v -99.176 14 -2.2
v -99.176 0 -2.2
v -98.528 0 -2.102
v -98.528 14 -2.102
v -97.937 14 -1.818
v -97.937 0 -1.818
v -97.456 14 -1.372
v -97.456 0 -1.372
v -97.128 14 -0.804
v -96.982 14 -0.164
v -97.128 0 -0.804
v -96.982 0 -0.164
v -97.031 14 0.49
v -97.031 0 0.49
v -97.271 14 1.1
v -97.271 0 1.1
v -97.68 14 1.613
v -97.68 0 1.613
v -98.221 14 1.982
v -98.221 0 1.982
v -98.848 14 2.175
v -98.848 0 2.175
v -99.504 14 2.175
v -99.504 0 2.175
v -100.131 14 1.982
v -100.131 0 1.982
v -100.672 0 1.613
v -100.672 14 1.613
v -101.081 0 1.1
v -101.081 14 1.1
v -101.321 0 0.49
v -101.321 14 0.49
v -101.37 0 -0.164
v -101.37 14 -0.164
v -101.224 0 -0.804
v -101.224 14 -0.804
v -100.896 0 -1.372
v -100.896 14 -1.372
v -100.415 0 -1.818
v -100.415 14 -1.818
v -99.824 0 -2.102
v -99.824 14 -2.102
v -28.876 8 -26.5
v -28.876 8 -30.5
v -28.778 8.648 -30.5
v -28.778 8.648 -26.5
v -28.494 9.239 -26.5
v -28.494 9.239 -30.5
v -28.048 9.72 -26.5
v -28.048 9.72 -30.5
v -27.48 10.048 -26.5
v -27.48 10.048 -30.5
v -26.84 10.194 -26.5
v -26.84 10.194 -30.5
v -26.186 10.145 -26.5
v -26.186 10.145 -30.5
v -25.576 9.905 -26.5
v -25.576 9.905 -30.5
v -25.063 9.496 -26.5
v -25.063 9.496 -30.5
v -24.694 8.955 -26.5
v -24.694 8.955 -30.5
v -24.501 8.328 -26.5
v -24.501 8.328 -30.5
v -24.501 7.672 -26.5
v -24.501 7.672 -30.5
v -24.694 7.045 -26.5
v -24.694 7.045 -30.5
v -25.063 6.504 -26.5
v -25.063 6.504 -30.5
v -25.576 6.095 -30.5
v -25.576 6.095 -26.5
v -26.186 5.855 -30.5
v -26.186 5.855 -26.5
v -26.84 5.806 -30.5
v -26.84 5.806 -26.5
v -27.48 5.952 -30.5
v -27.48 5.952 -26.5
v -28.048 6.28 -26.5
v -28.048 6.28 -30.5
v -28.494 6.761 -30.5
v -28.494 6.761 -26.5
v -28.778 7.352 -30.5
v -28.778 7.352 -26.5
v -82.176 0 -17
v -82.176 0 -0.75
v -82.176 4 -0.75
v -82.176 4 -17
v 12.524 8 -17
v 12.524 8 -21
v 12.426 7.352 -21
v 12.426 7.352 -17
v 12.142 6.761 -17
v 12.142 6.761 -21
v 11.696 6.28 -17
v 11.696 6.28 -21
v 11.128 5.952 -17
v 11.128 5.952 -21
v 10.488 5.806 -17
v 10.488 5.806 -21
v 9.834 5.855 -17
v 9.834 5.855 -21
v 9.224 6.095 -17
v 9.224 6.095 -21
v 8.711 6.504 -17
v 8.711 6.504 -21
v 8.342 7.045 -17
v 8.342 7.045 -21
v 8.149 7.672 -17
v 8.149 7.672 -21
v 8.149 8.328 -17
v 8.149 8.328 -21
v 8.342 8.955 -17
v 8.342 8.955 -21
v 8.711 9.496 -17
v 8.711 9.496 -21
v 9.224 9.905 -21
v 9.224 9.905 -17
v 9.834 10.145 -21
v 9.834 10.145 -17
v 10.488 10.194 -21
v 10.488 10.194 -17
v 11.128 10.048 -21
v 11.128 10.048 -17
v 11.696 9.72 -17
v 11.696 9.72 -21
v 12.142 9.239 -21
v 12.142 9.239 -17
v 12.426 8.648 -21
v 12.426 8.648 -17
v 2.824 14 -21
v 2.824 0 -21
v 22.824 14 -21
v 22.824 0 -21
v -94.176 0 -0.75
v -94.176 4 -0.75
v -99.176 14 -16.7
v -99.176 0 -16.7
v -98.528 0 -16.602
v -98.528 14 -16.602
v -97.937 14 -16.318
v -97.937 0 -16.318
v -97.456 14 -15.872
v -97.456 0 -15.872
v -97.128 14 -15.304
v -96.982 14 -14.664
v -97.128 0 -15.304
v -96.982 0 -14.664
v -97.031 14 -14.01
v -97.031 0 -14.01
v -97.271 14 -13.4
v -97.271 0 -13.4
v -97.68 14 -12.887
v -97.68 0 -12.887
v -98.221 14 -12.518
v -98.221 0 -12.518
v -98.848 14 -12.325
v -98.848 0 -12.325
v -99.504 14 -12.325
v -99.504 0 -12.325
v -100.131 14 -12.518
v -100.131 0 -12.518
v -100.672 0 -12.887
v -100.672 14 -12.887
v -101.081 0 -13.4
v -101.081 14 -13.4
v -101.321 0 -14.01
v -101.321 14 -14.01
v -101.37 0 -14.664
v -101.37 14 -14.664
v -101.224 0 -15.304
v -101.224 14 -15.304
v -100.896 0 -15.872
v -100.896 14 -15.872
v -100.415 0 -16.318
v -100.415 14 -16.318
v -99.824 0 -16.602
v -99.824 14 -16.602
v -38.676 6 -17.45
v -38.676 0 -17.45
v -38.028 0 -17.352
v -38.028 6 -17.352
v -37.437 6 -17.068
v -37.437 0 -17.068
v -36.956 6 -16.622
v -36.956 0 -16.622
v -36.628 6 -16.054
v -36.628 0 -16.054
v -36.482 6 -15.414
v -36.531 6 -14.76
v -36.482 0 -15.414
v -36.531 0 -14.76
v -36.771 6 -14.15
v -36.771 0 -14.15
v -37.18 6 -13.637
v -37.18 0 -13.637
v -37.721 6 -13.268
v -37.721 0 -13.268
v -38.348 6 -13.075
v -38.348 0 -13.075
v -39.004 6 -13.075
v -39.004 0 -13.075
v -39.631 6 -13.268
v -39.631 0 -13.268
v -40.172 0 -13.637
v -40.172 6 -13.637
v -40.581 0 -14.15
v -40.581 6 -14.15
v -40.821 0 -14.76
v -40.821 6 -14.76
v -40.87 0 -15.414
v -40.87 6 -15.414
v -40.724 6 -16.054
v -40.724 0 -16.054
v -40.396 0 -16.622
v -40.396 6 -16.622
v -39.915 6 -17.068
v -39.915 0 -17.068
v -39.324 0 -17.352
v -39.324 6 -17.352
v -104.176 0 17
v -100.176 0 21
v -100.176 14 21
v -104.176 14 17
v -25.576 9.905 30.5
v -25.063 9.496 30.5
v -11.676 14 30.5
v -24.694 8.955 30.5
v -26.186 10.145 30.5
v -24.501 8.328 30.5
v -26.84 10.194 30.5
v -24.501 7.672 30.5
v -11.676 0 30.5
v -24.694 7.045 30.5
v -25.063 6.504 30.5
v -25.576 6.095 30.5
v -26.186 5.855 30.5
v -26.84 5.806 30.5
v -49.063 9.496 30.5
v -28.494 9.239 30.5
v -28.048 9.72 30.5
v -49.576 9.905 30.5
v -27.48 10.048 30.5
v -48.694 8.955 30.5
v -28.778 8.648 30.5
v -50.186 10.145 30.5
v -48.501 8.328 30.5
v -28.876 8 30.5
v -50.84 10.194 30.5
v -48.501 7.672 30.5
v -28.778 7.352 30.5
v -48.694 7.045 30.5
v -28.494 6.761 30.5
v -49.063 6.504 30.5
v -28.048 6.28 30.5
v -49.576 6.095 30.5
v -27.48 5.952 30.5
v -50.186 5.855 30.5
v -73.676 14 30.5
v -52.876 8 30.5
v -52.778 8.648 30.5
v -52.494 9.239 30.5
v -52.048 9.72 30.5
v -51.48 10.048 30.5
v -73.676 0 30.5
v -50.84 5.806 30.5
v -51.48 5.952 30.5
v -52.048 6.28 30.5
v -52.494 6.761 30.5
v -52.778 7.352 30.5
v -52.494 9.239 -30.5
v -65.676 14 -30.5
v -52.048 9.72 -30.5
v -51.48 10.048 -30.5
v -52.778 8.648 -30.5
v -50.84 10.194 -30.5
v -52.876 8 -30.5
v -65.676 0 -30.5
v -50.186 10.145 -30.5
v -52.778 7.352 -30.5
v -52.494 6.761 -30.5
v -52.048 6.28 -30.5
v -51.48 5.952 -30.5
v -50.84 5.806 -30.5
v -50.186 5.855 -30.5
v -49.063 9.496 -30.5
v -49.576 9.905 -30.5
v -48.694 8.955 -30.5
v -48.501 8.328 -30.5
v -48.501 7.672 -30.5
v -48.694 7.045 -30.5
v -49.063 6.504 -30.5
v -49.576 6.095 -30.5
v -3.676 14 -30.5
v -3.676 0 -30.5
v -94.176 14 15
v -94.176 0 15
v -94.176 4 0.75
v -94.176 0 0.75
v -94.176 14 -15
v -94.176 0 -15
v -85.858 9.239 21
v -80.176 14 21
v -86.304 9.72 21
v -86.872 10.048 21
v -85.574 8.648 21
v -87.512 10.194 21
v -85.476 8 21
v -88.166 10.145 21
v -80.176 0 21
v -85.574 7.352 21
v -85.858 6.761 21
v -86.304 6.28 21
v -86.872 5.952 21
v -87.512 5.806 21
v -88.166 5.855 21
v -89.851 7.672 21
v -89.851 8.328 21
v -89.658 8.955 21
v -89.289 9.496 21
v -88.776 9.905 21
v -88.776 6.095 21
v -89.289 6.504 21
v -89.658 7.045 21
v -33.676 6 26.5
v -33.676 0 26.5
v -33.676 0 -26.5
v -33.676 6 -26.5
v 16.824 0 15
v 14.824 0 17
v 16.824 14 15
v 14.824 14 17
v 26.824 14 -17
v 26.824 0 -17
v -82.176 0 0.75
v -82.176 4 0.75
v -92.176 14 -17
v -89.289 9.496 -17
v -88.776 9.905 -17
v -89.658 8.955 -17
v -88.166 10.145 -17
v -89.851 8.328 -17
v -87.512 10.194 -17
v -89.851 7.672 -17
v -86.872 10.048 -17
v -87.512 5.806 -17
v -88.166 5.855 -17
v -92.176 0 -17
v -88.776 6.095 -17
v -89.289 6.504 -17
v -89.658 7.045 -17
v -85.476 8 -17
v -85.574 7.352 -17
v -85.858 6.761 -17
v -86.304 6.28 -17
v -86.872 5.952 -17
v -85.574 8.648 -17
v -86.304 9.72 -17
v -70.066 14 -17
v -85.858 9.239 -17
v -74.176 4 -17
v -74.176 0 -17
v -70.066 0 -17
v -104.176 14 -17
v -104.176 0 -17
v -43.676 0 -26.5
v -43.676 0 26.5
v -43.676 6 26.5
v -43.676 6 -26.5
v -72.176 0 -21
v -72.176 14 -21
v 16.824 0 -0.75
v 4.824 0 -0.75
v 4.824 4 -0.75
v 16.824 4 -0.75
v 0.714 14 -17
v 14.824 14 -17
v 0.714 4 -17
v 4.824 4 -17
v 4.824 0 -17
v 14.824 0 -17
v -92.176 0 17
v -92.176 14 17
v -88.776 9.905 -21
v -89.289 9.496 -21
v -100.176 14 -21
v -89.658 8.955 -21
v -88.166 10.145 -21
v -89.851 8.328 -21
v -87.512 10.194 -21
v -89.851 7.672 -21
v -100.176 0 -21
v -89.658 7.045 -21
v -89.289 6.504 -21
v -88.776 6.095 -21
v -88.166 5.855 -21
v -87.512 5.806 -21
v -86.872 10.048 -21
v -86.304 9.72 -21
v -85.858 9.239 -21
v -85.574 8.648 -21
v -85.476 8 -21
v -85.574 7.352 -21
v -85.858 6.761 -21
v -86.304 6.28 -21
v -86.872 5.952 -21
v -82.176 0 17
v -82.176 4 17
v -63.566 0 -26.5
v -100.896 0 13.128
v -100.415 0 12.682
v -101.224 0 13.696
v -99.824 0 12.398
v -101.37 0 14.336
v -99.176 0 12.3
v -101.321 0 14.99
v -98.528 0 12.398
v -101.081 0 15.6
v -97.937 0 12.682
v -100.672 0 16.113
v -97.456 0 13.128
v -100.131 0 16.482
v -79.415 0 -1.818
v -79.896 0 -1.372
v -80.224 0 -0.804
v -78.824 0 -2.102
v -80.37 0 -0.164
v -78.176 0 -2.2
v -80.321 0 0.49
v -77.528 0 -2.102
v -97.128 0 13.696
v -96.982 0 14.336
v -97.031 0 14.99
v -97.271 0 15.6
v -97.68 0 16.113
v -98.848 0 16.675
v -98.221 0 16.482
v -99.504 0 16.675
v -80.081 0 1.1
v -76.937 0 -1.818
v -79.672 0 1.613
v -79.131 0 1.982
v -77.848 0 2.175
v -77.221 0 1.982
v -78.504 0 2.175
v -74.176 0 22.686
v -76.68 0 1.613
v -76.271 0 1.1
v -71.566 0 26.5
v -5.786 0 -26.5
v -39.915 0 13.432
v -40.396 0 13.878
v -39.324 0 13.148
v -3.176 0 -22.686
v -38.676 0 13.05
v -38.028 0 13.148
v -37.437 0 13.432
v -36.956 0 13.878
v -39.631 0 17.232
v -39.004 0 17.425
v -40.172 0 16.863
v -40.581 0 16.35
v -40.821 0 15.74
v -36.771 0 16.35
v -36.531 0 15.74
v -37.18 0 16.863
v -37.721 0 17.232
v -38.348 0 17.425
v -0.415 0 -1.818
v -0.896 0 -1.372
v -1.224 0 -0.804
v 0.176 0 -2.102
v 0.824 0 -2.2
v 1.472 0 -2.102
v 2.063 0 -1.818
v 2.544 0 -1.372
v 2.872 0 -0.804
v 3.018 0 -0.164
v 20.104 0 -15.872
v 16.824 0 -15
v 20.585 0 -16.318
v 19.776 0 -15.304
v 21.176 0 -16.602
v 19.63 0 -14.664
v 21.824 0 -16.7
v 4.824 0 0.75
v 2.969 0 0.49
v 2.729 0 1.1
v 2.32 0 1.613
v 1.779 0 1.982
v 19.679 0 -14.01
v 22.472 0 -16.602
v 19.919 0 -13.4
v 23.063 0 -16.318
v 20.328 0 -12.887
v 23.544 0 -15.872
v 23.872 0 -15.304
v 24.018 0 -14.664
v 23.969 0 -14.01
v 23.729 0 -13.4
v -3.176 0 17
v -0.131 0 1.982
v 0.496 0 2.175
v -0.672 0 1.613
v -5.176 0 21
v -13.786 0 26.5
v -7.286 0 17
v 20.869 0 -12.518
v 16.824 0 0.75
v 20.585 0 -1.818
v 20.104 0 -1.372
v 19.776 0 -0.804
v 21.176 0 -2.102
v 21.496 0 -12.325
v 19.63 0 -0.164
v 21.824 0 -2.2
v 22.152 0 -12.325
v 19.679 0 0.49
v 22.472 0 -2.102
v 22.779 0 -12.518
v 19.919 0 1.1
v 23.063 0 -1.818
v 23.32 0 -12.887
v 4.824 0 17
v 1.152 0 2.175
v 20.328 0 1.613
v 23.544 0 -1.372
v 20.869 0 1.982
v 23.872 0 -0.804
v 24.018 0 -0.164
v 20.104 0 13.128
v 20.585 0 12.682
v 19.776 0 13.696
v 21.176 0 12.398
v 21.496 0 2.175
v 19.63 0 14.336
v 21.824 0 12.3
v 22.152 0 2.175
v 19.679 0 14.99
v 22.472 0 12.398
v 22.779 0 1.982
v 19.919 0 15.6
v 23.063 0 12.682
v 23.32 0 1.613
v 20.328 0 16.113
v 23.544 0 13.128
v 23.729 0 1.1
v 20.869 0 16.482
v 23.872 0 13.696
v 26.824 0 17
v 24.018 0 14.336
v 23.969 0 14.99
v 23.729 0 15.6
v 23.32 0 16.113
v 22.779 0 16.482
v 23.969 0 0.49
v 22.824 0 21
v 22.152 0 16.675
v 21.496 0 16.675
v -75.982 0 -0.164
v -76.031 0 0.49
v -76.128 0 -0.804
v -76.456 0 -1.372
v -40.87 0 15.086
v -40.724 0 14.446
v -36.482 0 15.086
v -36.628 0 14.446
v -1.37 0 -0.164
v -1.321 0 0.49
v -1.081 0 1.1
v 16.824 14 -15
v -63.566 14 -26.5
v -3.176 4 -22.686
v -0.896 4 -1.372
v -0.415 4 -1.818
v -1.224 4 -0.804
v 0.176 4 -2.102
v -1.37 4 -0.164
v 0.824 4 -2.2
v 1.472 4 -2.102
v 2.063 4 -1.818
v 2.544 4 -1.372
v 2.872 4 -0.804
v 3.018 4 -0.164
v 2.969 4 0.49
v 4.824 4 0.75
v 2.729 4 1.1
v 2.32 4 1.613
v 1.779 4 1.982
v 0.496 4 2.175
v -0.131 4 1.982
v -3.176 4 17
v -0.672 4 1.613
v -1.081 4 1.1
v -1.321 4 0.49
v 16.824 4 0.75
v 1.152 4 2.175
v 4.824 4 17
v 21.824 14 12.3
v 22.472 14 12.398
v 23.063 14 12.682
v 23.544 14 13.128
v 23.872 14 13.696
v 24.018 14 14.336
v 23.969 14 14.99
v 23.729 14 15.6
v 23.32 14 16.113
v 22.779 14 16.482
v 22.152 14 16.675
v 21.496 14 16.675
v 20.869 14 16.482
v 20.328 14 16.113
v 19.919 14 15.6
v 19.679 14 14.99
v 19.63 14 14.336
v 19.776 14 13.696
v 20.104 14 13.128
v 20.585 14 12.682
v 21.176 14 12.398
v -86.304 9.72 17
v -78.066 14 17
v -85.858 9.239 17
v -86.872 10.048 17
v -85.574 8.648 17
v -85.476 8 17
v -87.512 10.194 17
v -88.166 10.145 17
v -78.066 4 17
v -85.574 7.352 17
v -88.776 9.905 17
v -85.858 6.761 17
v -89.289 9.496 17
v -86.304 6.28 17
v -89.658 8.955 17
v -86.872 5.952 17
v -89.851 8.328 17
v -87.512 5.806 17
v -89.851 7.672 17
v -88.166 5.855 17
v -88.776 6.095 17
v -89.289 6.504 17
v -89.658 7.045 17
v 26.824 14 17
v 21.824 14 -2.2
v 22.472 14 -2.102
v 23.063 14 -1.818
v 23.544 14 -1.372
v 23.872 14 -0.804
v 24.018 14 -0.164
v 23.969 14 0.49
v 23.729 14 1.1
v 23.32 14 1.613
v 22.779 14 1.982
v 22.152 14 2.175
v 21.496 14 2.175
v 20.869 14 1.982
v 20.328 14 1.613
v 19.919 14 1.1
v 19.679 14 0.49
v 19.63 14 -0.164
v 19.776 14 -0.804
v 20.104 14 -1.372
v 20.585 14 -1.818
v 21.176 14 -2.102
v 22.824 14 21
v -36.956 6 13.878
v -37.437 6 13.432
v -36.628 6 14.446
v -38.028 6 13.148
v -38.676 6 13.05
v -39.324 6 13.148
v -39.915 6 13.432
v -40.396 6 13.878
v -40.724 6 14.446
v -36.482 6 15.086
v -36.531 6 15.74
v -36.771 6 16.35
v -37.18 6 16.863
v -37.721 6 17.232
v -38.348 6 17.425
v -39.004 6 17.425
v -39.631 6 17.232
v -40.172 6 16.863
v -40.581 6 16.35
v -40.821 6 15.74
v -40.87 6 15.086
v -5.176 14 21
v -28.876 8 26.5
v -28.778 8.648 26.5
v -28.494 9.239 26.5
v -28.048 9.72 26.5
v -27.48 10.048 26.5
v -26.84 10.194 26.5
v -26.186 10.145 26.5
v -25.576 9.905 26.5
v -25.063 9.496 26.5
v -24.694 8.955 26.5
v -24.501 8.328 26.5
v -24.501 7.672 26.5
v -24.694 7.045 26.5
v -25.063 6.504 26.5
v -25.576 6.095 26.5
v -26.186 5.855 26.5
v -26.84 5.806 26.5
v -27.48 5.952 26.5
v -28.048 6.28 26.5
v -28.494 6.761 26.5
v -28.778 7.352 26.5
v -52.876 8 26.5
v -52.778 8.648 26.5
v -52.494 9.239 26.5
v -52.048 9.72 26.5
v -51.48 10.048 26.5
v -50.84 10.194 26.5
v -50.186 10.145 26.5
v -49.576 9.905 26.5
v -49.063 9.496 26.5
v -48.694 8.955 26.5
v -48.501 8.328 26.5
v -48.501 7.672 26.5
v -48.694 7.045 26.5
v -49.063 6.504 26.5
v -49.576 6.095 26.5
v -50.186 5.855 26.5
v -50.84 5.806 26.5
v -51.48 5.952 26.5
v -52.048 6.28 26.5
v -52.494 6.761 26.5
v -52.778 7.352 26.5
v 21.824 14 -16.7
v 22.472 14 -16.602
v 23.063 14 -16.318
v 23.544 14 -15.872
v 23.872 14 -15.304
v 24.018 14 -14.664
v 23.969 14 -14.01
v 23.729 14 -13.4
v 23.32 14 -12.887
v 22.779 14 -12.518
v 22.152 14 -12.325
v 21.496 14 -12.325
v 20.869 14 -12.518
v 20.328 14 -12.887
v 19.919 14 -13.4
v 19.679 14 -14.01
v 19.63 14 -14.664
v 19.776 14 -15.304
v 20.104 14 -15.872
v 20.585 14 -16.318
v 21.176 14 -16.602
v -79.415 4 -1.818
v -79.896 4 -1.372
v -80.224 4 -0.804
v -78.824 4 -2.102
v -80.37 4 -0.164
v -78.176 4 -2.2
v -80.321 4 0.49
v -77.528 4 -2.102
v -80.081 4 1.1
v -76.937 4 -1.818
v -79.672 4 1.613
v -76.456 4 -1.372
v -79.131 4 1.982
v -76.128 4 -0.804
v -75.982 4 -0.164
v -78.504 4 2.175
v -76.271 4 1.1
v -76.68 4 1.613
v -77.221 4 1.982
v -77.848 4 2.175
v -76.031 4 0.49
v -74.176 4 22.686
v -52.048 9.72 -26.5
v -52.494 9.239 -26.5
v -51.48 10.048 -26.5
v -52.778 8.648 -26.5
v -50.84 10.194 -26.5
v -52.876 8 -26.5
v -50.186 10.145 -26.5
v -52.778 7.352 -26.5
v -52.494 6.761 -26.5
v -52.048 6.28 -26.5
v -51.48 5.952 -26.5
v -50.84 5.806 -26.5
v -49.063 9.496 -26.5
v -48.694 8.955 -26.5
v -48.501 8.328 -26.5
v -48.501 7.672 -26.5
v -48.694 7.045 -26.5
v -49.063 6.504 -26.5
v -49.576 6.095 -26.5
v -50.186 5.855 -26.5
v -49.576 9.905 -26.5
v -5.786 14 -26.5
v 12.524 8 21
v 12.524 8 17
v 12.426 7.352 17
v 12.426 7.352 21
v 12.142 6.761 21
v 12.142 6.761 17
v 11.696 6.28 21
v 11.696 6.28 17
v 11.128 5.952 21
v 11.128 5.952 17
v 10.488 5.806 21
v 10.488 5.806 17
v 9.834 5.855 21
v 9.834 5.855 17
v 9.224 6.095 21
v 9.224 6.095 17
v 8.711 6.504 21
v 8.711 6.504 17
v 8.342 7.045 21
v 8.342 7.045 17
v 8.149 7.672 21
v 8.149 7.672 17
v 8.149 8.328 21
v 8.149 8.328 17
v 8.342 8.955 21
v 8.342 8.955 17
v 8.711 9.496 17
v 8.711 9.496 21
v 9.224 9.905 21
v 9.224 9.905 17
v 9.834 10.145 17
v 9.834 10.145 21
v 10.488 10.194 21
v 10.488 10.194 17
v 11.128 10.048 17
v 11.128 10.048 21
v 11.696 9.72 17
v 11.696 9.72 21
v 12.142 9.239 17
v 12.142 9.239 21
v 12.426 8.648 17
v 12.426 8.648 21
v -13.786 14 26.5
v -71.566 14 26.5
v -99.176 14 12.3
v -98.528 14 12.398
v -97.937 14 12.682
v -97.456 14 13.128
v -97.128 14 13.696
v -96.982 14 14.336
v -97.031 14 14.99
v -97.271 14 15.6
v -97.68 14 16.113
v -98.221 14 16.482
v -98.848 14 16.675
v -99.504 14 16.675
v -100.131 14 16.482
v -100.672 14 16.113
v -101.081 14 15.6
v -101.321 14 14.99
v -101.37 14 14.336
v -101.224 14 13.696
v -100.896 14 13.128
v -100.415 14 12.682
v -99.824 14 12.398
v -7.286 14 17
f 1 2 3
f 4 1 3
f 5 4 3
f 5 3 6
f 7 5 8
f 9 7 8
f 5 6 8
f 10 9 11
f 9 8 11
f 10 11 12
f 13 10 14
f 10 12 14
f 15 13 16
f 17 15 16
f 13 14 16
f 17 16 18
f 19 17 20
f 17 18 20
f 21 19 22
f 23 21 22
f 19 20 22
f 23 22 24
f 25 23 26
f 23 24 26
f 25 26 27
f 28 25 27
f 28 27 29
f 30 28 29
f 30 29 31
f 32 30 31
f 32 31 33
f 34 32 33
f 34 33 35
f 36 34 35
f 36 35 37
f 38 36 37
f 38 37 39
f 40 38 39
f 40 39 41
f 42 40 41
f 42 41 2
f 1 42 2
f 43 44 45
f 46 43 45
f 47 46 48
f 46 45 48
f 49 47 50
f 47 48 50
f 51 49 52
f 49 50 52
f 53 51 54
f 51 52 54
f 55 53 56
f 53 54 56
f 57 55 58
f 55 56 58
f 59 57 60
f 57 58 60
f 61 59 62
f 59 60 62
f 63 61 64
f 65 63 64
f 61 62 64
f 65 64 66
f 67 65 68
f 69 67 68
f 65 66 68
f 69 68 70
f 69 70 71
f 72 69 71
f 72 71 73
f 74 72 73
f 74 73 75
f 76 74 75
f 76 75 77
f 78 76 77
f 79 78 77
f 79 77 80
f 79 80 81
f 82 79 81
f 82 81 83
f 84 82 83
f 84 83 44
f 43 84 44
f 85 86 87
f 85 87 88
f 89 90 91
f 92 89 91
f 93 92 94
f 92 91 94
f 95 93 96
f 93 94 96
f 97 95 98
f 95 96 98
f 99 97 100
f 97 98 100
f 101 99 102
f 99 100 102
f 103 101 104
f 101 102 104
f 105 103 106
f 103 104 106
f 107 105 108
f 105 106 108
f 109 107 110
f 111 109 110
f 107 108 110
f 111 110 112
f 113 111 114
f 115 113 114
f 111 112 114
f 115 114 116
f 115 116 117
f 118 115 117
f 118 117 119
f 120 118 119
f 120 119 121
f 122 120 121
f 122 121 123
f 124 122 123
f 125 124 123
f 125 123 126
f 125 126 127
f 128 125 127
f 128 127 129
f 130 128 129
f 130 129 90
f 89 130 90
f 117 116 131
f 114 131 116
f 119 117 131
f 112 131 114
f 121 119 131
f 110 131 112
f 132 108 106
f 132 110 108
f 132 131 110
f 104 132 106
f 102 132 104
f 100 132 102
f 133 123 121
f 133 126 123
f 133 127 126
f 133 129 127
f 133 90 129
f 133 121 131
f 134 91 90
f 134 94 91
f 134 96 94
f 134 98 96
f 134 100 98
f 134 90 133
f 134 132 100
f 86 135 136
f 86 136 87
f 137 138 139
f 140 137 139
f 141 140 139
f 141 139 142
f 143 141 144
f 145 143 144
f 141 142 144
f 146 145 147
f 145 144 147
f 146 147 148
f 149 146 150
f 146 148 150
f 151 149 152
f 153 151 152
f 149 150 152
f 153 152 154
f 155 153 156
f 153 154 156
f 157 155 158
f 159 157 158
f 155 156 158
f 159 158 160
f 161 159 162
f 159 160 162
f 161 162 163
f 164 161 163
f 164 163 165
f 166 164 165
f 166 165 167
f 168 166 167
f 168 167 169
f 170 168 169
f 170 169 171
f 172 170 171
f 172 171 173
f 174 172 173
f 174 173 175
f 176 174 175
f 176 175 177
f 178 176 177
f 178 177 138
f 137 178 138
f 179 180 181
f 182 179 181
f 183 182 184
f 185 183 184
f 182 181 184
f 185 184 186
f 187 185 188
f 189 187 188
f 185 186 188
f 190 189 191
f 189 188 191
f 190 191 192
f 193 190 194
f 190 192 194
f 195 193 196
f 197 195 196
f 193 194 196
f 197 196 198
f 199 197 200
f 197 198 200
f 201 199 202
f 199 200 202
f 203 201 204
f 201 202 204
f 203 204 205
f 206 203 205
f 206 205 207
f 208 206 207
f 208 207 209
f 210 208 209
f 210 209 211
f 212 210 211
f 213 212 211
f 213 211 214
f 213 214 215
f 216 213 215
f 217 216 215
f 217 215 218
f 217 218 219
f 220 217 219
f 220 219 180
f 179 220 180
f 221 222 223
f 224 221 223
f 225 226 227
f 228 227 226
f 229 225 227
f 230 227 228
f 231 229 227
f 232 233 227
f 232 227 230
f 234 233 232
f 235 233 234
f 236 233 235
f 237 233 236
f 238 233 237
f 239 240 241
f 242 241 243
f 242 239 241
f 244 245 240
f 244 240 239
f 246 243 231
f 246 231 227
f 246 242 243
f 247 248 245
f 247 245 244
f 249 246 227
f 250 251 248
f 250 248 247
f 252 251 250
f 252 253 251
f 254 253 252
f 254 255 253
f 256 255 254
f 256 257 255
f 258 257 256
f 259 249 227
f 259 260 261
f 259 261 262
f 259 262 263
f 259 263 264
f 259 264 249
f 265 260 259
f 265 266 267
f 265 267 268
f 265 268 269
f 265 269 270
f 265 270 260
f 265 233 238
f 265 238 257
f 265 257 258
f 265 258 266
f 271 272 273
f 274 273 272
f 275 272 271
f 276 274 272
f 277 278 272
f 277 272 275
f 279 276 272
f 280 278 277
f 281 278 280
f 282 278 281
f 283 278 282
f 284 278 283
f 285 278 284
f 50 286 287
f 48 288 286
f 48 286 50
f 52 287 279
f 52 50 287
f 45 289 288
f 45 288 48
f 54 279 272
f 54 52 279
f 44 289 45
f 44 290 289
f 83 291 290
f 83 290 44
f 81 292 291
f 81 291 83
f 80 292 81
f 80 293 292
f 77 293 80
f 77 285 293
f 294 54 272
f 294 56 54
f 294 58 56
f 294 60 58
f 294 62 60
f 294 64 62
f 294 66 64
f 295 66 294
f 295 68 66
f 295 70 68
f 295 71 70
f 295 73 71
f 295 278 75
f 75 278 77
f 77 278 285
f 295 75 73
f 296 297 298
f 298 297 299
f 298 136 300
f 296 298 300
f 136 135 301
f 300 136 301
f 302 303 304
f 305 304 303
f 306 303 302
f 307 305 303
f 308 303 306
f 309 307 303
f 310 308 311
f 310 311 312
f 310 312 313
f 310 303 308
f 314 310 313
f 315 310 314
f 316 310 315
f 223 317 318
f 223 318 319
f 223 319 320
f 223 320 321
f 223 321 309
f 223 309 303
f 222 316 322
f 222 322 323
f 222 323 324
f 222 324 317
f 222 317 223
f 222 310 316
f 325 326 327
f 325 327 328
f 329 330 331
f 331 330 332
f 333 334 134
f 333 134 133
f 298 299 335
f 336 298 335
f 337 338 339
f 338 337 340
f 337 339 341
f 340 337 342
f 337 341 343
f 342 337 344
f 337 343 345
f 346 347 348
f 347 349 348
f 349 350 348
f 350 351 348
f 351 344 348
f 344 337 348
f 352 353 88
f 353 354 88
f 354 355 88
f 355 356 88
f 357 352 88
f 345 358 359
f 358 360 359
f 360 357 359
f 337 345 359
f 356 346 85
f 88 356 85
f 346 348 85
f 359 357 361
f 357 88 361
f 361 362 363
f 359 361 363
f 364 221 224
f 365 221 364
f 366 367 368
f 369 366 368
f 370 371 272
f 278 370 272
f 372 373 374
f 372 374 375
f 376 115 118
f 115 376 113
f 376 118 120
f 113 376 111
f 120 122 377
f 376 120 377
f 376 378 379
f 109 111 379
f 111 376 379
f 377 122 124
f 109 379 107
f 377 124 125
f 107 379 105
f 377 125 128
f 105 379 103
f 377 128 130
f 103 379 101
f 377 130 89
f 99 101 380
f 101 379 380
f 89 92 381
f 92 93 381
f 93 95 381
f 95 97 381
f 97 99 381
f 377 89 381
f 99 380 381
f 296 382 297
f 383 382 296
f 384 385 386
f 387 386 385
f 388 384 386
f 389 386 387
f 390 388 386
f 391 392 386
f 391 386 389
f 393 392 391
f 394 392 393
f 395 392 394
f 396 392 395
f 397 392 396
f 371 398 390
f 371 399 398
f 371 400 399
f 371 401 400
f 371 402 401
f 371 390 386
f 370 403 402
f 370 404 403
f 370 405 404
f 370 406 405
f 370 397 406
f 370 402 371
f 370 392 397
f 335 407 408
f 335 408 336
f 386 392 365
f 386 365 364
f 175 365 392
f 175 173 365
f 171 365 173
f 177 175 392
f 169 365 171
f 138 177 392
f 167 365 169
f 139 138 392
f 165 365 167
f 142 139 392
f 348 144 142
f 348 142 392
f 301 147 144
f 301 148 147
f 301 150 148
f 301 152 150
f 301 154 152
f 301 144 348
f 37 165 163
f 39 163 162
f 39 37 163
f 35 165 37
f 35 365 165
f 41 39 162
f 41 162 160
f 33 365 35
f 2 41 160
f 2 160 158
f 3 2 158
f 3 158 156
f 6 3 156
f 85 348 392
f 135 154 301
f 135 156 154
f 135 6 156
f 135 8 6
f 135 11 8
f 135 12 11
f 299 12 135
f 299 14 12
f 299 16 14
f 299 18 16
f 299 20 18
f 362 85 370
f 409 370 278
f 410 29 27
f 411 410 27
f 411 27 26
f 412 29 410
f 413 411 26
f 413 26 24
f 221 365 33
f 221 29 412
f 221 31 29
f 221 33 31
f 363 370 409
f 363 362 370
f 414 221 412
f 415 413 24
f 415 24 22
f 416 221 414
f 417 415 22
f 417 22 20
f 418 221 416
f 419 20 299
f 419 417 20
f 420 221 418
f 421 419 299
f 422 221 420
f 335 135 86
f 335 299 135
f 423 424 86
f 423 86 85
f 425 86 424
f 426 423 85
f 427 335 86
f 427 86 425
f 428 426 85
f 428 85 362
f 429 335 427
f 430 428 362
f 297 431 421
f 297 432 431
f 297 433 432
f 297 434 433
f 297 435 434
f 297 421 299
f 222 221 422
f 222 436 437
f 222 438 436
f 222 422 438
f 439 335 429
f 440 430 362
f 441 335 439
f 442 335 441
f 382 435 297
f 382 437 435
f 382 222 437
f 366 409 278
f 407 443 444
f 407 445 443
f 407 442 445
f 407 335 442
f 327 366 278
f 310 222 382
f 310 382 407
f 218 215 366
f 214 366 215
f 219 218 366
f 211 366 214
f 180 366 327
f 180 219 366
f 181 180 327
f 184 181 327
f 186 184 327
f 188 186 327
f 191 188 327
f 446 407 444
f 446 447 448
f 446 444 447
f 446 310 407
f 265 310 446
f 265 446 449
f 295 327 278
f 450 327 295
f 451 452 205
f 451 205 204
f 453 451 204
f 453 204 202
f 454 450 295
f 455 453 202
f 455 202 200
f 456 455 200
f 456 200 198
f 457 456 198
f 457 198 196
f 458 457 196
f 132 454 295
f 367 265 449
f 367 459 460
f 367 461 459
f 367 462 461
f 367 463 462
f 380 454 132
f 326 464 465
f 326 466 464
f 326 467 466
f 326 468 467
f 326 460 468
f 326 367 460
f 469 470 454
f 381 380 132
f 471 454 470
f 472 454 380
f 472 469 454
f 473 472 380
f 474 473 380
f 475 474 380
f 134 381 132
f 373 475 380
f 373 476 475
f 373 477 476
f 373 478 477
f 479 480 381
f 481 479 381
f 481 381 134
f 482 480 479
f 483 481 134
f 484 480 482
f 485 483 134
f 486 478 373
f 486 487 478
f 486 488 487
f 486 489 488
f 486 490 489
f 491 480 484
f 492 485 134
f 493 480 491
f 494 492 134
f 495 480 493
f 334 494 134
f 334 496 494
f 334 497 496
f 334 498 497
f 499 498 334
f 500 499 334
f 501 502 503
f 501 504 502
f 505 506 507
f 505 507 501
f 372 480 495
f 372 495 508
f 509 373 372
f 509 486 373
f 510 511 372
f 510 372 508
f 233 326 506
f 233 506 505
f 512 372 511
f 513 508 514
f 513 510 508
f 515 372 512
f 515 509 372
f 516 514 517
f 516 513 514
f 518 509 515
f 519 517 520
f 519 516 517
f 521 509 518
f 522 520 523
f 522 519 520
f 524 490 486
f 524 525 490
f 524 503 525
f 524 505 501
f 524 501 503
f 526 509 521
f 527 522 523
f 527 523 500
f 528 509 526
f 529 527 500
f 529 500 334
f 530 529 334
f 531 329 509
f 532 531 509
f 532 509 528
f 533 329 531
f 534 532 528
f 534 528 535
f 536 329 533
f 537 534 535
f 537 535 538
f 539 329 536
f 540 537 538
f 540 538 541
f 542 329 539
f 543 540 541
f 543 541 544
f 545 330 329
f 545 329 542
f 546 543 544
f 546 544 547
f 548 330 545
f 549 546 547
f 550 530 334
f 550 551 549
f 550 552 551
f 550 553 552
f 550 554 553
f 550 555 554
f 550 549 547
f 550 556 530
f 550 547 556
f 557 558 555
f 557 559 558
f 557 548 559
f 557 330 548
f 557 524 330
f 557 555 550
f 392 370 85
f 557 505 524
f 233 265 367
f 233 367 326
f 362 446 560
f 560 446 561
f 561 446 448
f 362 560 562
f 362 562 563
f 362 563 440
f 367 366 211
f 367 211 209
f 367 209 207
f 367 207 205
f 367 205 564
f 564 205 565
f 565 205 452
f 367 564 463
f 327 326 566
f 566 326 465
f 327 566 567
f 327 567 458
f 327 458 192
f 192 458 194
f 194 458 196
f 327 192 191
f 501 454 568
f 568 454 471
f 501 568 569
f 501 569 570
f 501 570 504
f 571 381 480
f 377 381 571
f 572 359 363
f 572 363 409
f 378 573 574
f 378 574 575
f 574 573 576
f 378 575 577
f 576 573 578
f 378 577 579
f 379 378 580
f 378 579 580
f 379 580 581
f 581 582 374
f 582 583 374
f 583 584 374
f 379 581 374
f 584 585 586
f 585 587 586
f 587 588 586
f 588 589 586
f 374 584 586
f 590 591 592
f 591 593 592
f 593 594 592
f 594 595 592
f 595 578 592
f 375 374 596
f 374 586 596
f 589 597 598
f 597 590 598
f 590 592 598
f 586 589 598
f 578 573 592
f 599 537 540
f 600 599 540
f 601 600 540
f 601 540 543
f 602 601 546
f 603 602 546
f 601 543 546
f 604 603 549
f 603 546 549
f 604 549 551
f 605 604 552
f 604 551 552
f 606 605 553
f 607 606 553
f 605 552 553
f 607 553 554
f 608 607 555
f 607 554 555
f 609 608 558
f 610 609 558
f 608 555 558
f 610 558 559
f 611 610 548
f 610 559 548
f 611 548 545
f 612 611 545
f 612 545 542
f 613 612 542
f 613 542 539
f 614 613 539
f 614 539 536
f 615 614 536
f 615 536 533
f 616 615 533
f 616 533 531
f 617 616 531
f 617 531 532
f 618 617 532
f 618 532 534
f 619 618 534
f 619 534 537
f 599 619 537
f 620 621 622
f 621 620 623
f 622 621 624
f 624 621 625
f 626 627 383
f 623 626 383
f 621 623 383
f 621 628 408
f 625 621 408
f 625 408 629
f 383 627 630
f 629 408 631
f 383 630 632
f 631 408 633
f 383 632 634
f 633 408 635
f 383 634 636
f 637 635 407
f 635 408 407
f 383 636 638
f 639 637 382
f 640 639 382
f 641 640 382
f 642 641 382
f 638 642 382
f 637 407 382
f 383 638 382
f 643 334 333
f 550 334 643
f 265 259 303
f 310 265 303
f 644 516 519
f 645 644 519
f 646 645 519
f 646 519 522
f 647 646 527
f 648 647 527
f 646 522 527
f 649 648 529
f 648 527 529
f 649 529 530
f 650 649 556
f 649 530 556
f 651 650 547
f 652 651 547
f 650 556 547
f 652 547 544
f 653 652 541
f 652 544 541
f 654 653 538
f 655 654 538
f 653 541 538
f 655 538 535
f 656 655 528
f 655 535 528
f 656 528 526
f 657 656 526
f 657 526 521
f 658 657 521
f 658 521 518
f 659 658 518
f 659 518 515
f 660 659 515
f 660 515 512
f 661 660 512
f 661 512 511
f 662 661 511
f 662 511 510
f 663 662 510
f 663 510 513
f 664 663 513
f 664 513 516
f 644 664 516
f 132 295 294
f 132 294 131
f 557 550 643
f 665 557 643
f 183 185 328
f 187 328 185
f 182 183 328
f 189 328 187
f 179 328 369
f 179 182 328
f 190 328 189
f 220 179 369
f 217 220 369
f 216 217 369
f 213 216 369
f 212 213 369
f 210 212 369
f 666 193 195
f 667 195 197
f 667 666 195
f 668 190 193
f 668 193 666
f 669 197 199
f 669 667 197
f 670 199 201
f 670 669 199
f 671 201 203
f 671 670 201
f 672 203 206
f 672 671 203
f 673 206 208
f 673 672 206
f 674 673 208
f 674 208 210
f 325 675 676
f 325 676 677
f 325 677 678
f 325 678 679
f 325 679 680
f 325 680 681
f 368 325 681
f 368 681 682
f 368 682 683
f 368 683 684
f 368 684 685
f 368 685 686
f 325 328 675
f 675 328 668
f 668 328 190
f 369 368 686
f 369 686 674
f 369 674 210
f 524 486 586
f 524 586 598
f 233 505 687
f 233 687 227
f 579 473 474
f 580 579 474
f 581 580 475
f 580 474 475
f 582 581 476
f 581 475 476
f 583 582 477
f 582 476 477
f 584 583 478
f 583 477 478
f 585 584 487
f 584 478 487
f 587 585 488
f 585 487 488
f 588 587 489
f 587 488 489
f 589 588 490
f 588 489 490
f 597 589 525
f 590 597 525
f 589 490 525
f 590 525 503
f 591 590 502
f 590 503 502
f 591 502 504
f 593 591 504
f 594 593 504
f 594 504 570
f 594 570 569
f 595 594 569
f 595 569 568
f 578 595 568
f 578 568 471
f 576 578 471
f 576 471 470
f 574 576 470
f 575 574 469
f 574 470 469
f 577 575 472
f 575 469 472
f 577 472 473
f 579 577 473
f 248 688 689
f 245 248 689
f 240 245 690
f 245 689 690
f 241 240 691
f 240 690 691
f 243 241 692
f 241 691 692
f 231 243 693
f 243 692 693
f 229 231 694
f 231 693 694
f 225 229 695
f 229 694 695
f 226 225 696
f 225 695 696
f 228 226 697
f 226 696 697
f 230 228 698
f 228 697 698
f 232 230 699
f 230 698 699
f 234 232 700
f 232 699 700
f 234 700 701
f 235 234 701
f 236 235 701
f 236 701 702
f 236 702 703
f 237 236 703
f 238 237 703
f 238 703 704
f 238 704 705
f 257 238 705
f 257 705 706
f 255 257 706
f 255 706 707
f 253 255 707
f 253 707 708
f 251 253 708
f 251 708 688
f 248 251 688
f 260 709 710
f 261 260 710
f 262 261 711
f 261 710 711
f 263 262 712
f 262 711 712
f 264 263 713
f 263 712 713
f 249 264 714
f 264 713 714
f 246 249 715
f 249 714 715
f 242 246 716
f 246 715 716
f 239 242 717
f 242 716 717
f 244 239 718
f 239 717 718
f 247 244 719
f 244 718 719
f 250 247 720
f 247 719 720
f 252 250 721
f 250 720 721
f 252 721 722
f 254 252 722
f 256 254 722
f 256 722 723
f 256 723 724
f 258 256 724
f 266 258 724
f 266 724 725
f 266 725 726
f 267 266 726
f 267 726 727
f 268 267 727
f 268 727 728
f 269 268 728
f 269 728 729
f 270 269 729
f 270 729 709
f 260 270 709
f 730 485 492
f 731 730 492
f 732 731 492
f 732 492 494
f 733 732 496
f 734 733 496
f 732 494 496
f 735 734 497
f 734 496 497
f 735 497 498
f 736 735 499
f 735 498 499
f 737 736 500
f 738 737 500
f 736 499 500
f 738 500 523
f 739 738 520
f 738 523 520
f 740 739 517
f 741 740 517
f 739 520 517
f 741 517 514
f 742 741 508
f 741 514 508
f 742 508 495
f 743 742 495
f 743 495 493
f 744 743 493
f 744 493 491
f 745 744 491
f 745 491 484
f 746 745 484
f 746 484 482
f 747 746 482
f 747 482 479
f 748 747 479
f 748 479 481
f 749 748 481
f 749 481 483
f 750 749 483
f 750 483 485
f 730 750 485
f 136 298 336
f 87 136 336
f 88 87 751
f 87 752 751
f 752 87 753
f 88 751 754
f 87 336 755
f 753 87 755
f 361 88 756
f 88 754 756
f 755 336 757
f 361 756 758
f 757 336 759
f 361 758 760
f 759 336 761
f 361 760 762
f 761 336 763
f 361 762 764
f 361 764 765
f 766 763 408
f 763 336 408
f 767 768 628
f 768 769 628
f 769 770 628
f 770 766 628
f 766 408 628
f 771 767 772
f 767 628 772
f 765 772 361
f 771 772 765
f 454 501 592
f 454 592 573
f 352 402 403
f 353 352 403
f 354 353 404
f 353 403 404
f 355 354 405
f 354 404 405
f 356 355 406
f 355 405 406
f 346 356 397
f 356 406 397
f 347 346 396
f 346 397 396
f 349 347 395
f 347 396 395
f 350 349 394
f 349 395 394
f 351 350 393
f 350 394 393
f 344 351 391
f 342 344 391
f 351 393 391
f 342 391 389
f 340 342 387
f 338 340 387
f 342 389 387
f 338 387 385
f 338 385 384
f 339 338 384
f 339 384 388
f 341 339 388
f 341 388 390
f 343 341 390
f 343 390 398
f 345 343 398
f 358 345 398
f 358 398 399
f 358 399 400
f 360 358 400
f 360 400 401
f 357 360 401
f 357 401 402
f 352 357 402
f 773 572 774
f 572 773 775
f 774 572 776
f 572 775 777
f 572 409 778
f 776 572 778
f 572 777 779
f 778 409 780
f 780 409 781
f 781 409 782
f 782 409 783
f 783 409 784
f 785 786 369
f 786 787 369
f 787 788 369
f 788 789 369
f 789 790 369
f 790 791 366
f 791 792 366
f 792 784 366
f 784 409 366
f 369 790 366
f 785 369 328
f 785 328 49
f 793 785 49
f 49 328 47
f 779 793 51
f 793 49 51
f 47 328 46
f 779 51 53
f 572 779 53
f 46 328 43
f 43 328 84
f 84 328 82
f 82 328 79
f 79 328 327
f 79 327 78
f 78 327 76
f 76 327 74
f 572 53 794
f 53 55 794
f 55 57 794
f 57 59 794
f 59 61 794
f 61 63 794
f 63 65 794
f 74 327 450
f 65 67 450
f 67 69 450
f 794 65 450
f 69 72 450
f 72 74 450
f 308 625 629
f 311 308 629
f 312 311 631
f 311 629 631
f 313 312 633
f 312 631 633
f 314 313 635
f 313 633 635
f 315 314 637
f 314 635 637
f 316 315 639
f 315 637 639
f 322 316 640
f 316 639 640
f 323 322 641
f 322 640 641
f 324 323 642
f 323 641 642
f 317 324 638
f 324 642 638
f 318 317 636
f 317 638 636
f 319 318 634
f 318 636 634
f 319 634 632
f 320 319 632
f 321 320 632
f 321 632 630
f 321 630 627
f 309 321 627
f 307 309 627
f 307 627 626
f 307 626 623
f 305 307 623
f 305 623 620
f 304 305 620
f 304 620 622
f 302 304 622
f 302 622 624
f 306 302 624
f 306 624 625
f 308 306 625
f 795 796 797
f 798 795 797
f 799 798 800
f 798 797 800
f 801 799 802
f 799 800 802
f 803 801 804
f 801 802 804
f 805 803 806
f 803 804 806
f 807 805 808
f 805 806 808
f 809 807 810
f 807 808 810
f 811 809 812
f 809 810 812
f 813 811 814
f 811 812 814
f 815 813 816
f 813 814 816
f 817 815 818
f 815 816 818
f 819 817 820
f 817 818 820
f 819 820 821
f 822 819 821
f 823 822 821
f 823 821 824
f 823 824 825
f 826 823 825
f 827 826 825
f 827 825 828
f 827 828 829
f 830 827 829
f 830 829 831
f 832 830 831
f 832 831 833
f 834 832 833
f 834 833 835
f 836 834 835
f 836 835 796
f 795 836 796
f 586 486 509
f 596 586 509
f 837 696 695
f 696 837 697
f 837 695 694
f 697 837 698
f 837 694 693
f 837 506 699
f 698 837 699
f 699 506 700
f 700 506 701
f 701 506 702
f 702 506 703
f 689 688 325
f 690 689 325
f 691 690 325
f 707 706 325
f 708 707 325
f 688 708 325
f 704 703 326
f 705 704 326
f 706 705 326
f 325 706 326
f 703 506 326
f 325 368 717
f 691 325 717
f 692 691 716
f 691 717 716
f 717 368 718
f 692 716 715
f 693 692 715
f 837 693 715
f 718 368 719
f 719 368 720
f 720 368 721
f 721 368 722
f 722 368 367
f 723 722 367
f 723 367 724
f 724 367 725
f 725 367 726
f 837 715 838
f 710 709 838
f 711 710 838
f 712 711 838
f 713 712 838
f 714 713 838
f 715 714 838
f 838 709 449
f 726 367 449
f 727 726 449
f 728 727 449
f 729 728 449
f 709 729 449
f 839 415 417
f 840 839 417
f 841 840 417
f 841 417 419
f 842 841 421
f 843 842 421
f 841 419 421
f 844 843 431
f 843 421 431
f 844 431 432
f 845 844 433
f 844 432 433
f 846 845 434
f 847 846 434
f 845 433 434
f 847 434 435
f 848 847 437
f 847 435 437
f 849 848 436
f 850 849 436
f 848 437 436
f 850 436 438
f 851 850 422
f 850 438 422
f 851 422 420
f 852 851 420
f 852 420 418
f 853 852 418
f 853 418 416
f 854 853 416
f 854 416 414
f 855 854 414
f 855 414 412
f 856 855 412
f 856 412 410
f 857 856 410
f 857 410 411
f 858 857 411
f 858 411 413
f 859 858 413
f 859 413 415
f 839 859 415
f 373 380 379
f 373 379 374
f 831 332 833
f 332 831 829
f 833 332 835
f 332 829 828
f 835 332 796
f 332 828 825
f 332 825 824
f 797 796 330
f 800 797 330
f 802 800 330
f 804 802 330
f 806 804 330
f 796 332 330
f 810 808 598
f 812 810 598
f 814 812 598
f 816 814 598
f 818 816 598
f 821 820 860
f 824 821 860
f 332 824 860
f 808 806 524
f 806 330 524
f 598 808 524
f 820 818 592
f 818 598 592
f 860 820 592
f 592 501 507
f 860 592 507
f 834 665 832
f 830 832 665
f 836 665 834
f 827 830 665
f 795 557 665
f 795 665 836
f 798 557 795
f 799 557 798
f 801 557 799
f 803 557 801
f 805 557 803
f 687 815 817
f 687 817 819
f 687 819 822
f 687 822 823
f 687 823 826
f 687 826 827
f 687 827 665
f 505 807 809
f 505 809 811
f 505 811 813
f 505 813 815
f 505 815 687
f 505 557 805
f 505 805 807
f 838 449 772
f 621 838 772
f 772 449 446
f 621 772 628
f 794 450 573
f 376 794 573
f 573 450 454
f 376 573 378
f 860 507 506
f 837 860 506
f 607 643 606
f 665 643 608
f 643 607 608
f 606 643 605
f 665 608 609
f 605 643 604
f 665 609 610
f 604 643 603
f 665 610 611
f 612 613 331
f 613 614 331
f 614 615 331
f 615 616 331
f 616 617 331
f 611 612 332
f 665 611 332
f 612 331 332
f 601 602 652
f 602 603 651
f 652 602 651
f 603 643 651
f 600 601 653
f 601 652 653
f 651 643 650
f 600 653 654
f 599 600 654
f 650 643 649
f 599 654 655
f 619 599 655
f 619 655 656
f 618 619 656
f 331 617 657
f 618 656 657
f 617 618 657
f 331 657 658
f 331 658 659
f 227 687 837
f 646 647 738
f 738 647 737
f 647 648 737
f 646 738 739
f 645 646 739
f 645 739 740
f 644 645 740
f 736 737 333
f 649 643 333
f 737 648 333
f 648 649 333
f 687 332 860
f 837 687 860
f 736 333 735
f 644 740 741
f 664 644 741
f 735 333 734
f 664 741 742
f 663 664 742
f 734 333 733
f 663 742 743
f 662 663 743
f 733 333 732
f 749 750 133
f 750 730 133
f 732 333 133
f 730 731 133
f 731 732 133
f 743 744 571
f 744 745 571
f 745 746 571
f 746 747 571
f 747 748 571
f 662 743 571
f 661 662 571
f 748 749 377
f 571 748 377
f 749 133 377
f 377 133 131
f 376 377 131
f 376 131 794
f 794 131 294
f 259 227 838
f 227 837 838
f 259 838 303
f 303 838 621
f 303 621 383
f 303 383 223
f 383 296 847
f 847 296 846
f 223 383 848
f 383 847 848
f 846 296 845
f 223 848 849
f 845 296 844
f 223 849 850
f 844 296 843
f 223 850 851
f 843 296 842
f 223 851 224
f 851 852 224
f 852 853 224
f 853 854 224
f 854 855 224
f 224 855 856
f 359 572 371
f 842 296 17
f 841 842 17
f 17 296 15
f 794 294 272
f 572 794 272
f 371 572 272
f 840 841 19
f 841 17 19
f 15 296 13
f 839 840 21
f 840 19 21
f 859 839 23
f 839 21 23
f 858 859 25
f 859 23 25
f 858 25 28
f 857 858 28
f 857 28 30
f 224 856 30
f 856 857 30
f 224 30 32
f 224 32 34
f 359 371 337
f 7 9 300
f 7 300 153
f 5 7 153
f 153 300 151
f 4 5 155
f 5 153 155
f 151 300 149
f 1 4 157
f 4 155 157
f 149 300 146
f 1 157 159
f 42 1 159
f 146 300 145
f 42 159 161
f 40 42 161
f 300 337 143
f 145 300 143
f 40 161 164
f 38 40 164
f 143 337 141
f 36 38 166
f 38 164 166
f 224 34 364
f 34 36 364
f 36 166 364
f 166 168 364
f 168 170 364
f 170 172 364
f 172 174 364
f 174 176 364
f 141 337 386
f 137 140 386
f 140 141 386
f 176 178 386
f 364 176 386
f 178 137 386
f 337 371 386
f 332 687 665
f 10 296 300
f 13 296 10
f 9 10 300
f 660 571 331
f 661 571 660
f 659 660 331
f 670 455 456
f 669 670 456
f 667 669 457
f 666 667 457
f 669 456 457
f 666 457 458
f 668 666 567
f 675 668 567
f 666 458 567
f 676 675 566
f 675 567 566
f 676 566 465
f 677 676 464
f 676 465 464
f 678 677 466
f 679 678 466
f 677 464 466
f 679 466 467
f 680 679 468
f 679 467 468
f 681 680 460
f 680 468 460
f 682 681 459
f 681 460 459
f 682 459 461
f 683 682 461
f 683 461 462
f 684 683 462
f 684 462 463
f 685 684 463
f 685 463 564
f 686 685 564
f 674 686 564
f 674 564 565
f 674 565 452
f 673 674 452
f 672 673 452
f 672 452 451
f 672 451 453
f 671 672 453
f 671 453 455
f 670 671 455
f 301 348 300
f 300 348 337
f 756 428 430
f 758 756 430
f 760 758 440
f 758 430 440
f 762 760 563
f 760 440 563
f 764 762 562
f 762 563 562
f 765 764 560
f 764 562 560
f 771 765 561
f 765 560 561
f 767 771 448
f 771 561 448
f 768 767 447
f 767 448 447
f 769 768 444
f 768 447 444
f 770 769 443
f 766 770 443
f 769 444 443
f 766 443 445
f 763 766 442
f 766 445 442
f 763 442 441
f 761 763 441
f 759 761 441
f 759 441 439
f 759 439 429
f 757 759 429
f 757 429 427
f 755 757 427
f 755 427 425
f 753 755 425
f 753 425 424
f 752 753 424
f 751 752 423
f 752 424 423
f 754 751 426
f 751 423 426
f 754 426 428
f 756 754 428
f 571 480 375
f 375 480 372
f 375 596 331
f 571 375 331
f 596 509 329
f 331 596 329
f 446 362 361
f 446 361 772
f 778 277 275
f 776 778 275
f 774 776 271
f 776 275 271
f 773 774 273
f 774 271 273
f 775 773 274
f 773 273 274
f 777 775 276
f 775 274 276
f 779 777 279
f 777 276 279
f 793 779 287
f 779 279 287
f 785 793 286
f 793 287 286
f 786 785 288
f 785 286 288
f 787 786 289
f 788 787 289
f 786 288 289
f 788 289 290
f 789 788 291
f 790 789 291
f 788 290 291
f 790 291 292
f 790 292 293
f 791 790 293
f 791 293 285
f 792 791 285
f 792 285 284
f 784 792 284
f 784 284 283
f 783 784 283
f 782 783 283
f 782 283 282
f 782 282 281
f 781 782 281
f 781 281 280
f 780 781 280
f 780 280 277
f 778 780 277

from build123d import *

# Parameters (mm, degrees)
BOSS_EXTRUDE1_DEPTH = 14
CUT_EXTRUDE1_REACH  = 16
SKETCH2_R           = 2.2
SKETCH5_R           = 2.2
CUT_EXTRUDE2_DEPTH  = 62
BOSS_EXTRUDE2_REACH = 59
SKETCH6_W           = 10
SKETCH6_H           = 6
SKETCH7_W           = 12
SKETCH7_H           = 1.5
SKETCH7_R           = 2.2
BOSS_EXTRUDE3_DEPTH = 4
CUT_EXTRUDE3_REACH  = 16
SKETCH8_R           = 2.2
CHAMFER1_SIZE       = 4
CHAMFER2_SIZE       = 2


with BuildPart() as part:
    # Sketch1 → Boss-Extrude1 (new body)
    with BuildSketch(Plane(origin=(0, 0, 0), x_dir=(1, 0, 0), z_dir=(0, 1, 0))):
        Polygon((-104.176003517, -21), (-104.176003517, 21), (-72.176003517, 21), (-65.676003517, 30.5), (-3.676003517, 30.5), (2.823996483, 21), (26.823996483, 21), (26.823996483, -21), (-5.176003517, -21), (-11.676003517, -30.5), (-73.676003517, -30.5), (-80.176003517, -21), align=None)
        Polygon((-94.176003517, -17), (-94.176003517, 17), (-70.066165861, 17), (-63.566165861, 26.5), (-5.785841173, 26.5), (0.714158827, 17), (16.823996483, 17), (16.823996483, -17), (-7.285841173, -17), (-13.785841173, -26.5), (-71.566165861, -26.5), (-78.066165861, -17), align=None, mode=Mode.SUBTRACT)
    extrude(amount=BOSS_EXTRUDE1_DEPTH)

    # Sketch2 → Cut-Extrude1 (cut, up to next)
    with BuildSketch(Plane(origin=(0, 0, 0), x_dir=(-1, 0, 0), z_dir=(0, -1, 0)), mode=Mode.PRIVATE) as cut_extrude1_sk1:
        with Locations(Location((99.176003517, 14.5, 0), (0, 0, 90))):  # turned: the seam where the file's is
            Circle(SKETCH2_R)
    cut_extrude1_tool1 = extrude(cut_extrude1_sk1.sketch, amount=-CUT_EXTRUDE1_REACH, mode=Mode.PRIVATE) & part.part
    add(cut_extrude1_tool1.solids().sort_by_distance((-99.176004, 0, -14.5))[0], mode=Mode.SUBTRACT)
    # Sketch2 → Cut-Extrude1 (cut, up to next)
    with BuildSketch(Plane(origin=(0, 0, 0), x_dir=(-1, 0, 0), z_dir=(0, -1, 0)), mode=Mode.PRIVATE) as cut_extrude1_sk2:
        with Locations(Location((99.176003517, 0, 0), (0, 0, 90))):  # turned: the seam where the file's is
            Circle(SKETCH2_R)
    cut_extrude1_tool2 = extrude(cut_extrude1_sk2.sketch, amount=-CUT_EXTRUDE1_REACH, mode=Mode.PRIVATE) & part.part
    add(cut_extrude1_tool2.solids().sort_by_distance((-99.176004, 0, 0))[0], mode=Mode.SUBTRACT)
    # Sketch2 → Cut-Extrude1 (cut, up to next)
    with BuildSketch(Plane(origin=(0, 0, 0), x_dir=(-1, 0, 0), z_dir=(0, -1, 0)), mode=Mode.PRIVATE) as cut_extrude1_sk3:
        with Locations(Location((99.176003517, -14.5, 0), (0, 0, 90))):  # turned: the seam where the file's is
            Circle(SKETCH2_R)
    cut_extrude1_tool3 = extrude(cut_extrude1_sk3.sketch, amount=-CUT_EXTRUDE1_REACH, mode=Mode.PRIVATE) & part.part
    add(cut_extrude1_tool3.solids().sort_by_distance((-99.176004, 0, 14.5))[0], mode=Mode.SUBTRACT)
    # Sketch2 → Cut-Extrude1 (cut, up to next)
    with BuildSketch(Plane(origin=(0, 0, 0), x_dir=(-1, 0, 0), z_dir=(0, -1, 0)), mode=Mode.PRIVATE) as cut_extrude1_sk4:
        with Locations(Location((-21.823996483, -14.5, 0), (0, 0, 90))):  # turned: the seam where the file's is
            Circle(SKETCH2_R)
    cut_extrude1_tool4 = extrude(cut_extrude1_sk4.sketch, amount=-CUT_EXTRUDE1_REACH, mode=Mode.PRIVATE) & part.part
    add(cut_extrude1_tool4.solids().sort_by_distance((21.823996, 0, 14.5))[0], mode=Mode.SUBTRACT)
    # Sketch2 → Cut-Extrude1 (cut, up to next)
    with BuildSketch(Plane(origin=(0, 0, 0), x_dir=(-1, 0, 0), z_dir=(0, -1, 0)), mode=Mode.PRIVATE) as cut_extrude1_sk5:
        with Locations(Location((-21.823996483, 0, 0), (0, 0, 90))):  # turned: the seam where the file's is
            Circle(SKETCH2_R)
    cut_extrude1_tool5 = extrude(cut_extrude1_sk5.sketch, amount=-CUT_EXTRUDE1_REACH, mode=Mode.PRIVATE) & part.part
    add(cut_extrude1_tool5.solids().sort_by_distance((21.823996, 0, 0))[0], mode=Mode.SUBTRACT)
    # Sketch2 → Cut-Extrude1 (cut, up to next)
    with BuildSketch(Plane(origin=(0, 0, 0), x_dir=(-1, 0, 0), z_dir=(0, -1, 0)), mode=Mode.PRIVATE) as cut_extrude1_sk6:
        with Locations(Location((-21.823996483, 14.5, 0), (0, 0, 90))):  # turned: the seam where the file's is
            Circle(SKETCH2_R)
    cut_extrude1_tool6 = extrude(cut_extrude1_sk6.sketch, amount=-CUT_EXTRUDE1_REACH, mode=Mode.PRIVATE) & part.part
    add(cut_extrude1_tool6.solids().sort_by_distance((21.823996, 0, -14.5))[0], mode=Mode.SUBTRACT)

    # Sketch5 → Cut-Extrude2 (cut, through all)
    with BuildSketch(Plane(origin=(0, 0, -30.5), x_dir=(-1, 0, 0), z_dir=(0, 0, -1))):
        with Locations((50.676003517, 8)):
            Circle(SKETCH5_R)
        with Locations((26.676003517, 8)):
            Circle(SKETCH5_R)
        with Locations(Location((87.676003517, 8, 0), (0, 0, 180))):  # turned: the seam where the file's is
            Circle(SKETCH5_R)
        with Locations(Location((-10.323996483, 8, 0), (0, 0, 180))):  # turned: the seam where the file's is
            Circle(SKETCH5_R)
    extrude(amount=-CUT_EXTRUDE2_DEPTH, mode=Mode.SUBTRACT)

    # Sketch6 → Boss-Extrude2 (add, up to next)
    with BuildSketch(Plane(origin=(0, 0, 26.5), x_dir=(-1, 0, 0), z_dir=(0, 0, -1)), mode=Mode.PRIVATE) as boss_extrude2_sk1:
        with Locations((38.676003517, 3)):
            Rectangle(SKETCH6_W, SKETCH6_H)
    boss_extrude2_tool1 = extrude(boss_extrude2_sk1.sketch, amount=BOSS_EXTRUDE2_REACH, mode=Mode.PRIVATE) - part.part
    add(boss_extrude2_tool1.solids().sort_by_distance((-38.676004, 3, 26.5))[0])

    # Sketch7 → Boss-Extrude3 (add)
    with BuildSketch(Plane.XZ):
        with Locations((-88.176003517, 0)):
            Rectangle(SKETCH7_W, SKETCH7_H)
        Polygon((-78.066165861, 17), (-82.176003517, 17), (-82.176003517, 0.75), (-82.176003517, -0.75), (-82.176003517, -17), (-74.176003517, -17), (-74.176003517, 22.685621887), align=None)
        with Locations(Location((-78.176003517, 0, 0), (0, 0, 270))):  # turned: the seam where the file's is
            Circle(SKETCH7_R, mode=Mode.SUBTRACT)
        Polygon((4.823996483, 0.75), (4.823996483, 17), (-3.176003517, 17), (-3.176003517, -22.685621887), (0.714158827, -17), (4.823996483, -17), (4.823996483, -0.75), align=None)
        with Locations(Location((0.823996483, 0, 0), (0, 0, 270))):  # turned: the seam where the file's is
            Circle(SKETCH7_R, mode=Mode.SUBTRACT)
        with Locations((10.823996483, 0)):
            Rectangle(SKETCH7_W, SKETCH7_H)
    extrude(amount=-BOSS_EXTRUDE3_DEPTH)

    # Sketch8 → Cut-Extrude3 (cut, up to next)
    with BuildSketch(Plane(origin=(0, 0, 0), x_dir=(-1, 0, 0), z_dir=(0, -1, 0)), mode=Mode.PRIVATE) as cut_extrude3_sk1:
        with Locations(Location((38.676003517, -15.25, 0), (0, 0, 90))):  # turned: the seam where the file's is
            Circle(SKETCH8_R)
    cut_extrude3_tool1 = extrude(cut_extrude3_sk1.sketch, amount=-CUT_EXTRUDE3_REACH, mode=Mode.PRIVATE) & part.part
    add(cut_extrude3_tool1.solids().sort_by_distance((-38.676004, 0, 15.25))[0], mode=Mode.SUBTRACT)
    # Sketch8 → Cut-Extrude3 (cut, up to next)
    with BuildSketch(Plane(origin=(0, 0, 0), x_dir=(-1, 0, 0), z_dir=(0, -1, 0)), mode=Mode.PRIVATE) as cut_extrude3_sk2:
        with Locations(Location((38.676003517, 15.25, 0), (0, 0, 90))):  # turned: the seam where the file's is
            Circle(SKETCH8_R)
    cut_extrude3_tool2 = extrude(cut_extrude3_sk2.sketch, amount=-CUT_EXTRUDE3_REACH, mode=Mode.PRIVATE) & part.part
    add(cut_extrude3_tool2.solids().sort_by_distance((-38.676004, 0, -15.25))[0], mode=Mode.SUBTRACT)

    # Chamfer1
    chamfer1_edges = [part.edges().sort_by_distance(p)[0] for p in [
        (-104.176003517, 7, 21),
        (-104.176003517, 7, -21),
        (26.823996483, 7, -21),
        (26.823996483, 7, 21),
    ]]
    chamfer(chamfer1_edges, length=CHAMFER1_SIZE)

    # Chamfer2
    chamfer2_edges = [part.edges().sort_by_distance(p)[0] for p in [
        (-94.176003517, 7, 17),
        (16.823996483, 7, 17),
        (16.823996483, 7, -17),
        (-94.176003517, 7, -17),
    ]]
    chamfer(chamfer2_edges, length=CHAMFER2_SIZE)


solid = part.part
